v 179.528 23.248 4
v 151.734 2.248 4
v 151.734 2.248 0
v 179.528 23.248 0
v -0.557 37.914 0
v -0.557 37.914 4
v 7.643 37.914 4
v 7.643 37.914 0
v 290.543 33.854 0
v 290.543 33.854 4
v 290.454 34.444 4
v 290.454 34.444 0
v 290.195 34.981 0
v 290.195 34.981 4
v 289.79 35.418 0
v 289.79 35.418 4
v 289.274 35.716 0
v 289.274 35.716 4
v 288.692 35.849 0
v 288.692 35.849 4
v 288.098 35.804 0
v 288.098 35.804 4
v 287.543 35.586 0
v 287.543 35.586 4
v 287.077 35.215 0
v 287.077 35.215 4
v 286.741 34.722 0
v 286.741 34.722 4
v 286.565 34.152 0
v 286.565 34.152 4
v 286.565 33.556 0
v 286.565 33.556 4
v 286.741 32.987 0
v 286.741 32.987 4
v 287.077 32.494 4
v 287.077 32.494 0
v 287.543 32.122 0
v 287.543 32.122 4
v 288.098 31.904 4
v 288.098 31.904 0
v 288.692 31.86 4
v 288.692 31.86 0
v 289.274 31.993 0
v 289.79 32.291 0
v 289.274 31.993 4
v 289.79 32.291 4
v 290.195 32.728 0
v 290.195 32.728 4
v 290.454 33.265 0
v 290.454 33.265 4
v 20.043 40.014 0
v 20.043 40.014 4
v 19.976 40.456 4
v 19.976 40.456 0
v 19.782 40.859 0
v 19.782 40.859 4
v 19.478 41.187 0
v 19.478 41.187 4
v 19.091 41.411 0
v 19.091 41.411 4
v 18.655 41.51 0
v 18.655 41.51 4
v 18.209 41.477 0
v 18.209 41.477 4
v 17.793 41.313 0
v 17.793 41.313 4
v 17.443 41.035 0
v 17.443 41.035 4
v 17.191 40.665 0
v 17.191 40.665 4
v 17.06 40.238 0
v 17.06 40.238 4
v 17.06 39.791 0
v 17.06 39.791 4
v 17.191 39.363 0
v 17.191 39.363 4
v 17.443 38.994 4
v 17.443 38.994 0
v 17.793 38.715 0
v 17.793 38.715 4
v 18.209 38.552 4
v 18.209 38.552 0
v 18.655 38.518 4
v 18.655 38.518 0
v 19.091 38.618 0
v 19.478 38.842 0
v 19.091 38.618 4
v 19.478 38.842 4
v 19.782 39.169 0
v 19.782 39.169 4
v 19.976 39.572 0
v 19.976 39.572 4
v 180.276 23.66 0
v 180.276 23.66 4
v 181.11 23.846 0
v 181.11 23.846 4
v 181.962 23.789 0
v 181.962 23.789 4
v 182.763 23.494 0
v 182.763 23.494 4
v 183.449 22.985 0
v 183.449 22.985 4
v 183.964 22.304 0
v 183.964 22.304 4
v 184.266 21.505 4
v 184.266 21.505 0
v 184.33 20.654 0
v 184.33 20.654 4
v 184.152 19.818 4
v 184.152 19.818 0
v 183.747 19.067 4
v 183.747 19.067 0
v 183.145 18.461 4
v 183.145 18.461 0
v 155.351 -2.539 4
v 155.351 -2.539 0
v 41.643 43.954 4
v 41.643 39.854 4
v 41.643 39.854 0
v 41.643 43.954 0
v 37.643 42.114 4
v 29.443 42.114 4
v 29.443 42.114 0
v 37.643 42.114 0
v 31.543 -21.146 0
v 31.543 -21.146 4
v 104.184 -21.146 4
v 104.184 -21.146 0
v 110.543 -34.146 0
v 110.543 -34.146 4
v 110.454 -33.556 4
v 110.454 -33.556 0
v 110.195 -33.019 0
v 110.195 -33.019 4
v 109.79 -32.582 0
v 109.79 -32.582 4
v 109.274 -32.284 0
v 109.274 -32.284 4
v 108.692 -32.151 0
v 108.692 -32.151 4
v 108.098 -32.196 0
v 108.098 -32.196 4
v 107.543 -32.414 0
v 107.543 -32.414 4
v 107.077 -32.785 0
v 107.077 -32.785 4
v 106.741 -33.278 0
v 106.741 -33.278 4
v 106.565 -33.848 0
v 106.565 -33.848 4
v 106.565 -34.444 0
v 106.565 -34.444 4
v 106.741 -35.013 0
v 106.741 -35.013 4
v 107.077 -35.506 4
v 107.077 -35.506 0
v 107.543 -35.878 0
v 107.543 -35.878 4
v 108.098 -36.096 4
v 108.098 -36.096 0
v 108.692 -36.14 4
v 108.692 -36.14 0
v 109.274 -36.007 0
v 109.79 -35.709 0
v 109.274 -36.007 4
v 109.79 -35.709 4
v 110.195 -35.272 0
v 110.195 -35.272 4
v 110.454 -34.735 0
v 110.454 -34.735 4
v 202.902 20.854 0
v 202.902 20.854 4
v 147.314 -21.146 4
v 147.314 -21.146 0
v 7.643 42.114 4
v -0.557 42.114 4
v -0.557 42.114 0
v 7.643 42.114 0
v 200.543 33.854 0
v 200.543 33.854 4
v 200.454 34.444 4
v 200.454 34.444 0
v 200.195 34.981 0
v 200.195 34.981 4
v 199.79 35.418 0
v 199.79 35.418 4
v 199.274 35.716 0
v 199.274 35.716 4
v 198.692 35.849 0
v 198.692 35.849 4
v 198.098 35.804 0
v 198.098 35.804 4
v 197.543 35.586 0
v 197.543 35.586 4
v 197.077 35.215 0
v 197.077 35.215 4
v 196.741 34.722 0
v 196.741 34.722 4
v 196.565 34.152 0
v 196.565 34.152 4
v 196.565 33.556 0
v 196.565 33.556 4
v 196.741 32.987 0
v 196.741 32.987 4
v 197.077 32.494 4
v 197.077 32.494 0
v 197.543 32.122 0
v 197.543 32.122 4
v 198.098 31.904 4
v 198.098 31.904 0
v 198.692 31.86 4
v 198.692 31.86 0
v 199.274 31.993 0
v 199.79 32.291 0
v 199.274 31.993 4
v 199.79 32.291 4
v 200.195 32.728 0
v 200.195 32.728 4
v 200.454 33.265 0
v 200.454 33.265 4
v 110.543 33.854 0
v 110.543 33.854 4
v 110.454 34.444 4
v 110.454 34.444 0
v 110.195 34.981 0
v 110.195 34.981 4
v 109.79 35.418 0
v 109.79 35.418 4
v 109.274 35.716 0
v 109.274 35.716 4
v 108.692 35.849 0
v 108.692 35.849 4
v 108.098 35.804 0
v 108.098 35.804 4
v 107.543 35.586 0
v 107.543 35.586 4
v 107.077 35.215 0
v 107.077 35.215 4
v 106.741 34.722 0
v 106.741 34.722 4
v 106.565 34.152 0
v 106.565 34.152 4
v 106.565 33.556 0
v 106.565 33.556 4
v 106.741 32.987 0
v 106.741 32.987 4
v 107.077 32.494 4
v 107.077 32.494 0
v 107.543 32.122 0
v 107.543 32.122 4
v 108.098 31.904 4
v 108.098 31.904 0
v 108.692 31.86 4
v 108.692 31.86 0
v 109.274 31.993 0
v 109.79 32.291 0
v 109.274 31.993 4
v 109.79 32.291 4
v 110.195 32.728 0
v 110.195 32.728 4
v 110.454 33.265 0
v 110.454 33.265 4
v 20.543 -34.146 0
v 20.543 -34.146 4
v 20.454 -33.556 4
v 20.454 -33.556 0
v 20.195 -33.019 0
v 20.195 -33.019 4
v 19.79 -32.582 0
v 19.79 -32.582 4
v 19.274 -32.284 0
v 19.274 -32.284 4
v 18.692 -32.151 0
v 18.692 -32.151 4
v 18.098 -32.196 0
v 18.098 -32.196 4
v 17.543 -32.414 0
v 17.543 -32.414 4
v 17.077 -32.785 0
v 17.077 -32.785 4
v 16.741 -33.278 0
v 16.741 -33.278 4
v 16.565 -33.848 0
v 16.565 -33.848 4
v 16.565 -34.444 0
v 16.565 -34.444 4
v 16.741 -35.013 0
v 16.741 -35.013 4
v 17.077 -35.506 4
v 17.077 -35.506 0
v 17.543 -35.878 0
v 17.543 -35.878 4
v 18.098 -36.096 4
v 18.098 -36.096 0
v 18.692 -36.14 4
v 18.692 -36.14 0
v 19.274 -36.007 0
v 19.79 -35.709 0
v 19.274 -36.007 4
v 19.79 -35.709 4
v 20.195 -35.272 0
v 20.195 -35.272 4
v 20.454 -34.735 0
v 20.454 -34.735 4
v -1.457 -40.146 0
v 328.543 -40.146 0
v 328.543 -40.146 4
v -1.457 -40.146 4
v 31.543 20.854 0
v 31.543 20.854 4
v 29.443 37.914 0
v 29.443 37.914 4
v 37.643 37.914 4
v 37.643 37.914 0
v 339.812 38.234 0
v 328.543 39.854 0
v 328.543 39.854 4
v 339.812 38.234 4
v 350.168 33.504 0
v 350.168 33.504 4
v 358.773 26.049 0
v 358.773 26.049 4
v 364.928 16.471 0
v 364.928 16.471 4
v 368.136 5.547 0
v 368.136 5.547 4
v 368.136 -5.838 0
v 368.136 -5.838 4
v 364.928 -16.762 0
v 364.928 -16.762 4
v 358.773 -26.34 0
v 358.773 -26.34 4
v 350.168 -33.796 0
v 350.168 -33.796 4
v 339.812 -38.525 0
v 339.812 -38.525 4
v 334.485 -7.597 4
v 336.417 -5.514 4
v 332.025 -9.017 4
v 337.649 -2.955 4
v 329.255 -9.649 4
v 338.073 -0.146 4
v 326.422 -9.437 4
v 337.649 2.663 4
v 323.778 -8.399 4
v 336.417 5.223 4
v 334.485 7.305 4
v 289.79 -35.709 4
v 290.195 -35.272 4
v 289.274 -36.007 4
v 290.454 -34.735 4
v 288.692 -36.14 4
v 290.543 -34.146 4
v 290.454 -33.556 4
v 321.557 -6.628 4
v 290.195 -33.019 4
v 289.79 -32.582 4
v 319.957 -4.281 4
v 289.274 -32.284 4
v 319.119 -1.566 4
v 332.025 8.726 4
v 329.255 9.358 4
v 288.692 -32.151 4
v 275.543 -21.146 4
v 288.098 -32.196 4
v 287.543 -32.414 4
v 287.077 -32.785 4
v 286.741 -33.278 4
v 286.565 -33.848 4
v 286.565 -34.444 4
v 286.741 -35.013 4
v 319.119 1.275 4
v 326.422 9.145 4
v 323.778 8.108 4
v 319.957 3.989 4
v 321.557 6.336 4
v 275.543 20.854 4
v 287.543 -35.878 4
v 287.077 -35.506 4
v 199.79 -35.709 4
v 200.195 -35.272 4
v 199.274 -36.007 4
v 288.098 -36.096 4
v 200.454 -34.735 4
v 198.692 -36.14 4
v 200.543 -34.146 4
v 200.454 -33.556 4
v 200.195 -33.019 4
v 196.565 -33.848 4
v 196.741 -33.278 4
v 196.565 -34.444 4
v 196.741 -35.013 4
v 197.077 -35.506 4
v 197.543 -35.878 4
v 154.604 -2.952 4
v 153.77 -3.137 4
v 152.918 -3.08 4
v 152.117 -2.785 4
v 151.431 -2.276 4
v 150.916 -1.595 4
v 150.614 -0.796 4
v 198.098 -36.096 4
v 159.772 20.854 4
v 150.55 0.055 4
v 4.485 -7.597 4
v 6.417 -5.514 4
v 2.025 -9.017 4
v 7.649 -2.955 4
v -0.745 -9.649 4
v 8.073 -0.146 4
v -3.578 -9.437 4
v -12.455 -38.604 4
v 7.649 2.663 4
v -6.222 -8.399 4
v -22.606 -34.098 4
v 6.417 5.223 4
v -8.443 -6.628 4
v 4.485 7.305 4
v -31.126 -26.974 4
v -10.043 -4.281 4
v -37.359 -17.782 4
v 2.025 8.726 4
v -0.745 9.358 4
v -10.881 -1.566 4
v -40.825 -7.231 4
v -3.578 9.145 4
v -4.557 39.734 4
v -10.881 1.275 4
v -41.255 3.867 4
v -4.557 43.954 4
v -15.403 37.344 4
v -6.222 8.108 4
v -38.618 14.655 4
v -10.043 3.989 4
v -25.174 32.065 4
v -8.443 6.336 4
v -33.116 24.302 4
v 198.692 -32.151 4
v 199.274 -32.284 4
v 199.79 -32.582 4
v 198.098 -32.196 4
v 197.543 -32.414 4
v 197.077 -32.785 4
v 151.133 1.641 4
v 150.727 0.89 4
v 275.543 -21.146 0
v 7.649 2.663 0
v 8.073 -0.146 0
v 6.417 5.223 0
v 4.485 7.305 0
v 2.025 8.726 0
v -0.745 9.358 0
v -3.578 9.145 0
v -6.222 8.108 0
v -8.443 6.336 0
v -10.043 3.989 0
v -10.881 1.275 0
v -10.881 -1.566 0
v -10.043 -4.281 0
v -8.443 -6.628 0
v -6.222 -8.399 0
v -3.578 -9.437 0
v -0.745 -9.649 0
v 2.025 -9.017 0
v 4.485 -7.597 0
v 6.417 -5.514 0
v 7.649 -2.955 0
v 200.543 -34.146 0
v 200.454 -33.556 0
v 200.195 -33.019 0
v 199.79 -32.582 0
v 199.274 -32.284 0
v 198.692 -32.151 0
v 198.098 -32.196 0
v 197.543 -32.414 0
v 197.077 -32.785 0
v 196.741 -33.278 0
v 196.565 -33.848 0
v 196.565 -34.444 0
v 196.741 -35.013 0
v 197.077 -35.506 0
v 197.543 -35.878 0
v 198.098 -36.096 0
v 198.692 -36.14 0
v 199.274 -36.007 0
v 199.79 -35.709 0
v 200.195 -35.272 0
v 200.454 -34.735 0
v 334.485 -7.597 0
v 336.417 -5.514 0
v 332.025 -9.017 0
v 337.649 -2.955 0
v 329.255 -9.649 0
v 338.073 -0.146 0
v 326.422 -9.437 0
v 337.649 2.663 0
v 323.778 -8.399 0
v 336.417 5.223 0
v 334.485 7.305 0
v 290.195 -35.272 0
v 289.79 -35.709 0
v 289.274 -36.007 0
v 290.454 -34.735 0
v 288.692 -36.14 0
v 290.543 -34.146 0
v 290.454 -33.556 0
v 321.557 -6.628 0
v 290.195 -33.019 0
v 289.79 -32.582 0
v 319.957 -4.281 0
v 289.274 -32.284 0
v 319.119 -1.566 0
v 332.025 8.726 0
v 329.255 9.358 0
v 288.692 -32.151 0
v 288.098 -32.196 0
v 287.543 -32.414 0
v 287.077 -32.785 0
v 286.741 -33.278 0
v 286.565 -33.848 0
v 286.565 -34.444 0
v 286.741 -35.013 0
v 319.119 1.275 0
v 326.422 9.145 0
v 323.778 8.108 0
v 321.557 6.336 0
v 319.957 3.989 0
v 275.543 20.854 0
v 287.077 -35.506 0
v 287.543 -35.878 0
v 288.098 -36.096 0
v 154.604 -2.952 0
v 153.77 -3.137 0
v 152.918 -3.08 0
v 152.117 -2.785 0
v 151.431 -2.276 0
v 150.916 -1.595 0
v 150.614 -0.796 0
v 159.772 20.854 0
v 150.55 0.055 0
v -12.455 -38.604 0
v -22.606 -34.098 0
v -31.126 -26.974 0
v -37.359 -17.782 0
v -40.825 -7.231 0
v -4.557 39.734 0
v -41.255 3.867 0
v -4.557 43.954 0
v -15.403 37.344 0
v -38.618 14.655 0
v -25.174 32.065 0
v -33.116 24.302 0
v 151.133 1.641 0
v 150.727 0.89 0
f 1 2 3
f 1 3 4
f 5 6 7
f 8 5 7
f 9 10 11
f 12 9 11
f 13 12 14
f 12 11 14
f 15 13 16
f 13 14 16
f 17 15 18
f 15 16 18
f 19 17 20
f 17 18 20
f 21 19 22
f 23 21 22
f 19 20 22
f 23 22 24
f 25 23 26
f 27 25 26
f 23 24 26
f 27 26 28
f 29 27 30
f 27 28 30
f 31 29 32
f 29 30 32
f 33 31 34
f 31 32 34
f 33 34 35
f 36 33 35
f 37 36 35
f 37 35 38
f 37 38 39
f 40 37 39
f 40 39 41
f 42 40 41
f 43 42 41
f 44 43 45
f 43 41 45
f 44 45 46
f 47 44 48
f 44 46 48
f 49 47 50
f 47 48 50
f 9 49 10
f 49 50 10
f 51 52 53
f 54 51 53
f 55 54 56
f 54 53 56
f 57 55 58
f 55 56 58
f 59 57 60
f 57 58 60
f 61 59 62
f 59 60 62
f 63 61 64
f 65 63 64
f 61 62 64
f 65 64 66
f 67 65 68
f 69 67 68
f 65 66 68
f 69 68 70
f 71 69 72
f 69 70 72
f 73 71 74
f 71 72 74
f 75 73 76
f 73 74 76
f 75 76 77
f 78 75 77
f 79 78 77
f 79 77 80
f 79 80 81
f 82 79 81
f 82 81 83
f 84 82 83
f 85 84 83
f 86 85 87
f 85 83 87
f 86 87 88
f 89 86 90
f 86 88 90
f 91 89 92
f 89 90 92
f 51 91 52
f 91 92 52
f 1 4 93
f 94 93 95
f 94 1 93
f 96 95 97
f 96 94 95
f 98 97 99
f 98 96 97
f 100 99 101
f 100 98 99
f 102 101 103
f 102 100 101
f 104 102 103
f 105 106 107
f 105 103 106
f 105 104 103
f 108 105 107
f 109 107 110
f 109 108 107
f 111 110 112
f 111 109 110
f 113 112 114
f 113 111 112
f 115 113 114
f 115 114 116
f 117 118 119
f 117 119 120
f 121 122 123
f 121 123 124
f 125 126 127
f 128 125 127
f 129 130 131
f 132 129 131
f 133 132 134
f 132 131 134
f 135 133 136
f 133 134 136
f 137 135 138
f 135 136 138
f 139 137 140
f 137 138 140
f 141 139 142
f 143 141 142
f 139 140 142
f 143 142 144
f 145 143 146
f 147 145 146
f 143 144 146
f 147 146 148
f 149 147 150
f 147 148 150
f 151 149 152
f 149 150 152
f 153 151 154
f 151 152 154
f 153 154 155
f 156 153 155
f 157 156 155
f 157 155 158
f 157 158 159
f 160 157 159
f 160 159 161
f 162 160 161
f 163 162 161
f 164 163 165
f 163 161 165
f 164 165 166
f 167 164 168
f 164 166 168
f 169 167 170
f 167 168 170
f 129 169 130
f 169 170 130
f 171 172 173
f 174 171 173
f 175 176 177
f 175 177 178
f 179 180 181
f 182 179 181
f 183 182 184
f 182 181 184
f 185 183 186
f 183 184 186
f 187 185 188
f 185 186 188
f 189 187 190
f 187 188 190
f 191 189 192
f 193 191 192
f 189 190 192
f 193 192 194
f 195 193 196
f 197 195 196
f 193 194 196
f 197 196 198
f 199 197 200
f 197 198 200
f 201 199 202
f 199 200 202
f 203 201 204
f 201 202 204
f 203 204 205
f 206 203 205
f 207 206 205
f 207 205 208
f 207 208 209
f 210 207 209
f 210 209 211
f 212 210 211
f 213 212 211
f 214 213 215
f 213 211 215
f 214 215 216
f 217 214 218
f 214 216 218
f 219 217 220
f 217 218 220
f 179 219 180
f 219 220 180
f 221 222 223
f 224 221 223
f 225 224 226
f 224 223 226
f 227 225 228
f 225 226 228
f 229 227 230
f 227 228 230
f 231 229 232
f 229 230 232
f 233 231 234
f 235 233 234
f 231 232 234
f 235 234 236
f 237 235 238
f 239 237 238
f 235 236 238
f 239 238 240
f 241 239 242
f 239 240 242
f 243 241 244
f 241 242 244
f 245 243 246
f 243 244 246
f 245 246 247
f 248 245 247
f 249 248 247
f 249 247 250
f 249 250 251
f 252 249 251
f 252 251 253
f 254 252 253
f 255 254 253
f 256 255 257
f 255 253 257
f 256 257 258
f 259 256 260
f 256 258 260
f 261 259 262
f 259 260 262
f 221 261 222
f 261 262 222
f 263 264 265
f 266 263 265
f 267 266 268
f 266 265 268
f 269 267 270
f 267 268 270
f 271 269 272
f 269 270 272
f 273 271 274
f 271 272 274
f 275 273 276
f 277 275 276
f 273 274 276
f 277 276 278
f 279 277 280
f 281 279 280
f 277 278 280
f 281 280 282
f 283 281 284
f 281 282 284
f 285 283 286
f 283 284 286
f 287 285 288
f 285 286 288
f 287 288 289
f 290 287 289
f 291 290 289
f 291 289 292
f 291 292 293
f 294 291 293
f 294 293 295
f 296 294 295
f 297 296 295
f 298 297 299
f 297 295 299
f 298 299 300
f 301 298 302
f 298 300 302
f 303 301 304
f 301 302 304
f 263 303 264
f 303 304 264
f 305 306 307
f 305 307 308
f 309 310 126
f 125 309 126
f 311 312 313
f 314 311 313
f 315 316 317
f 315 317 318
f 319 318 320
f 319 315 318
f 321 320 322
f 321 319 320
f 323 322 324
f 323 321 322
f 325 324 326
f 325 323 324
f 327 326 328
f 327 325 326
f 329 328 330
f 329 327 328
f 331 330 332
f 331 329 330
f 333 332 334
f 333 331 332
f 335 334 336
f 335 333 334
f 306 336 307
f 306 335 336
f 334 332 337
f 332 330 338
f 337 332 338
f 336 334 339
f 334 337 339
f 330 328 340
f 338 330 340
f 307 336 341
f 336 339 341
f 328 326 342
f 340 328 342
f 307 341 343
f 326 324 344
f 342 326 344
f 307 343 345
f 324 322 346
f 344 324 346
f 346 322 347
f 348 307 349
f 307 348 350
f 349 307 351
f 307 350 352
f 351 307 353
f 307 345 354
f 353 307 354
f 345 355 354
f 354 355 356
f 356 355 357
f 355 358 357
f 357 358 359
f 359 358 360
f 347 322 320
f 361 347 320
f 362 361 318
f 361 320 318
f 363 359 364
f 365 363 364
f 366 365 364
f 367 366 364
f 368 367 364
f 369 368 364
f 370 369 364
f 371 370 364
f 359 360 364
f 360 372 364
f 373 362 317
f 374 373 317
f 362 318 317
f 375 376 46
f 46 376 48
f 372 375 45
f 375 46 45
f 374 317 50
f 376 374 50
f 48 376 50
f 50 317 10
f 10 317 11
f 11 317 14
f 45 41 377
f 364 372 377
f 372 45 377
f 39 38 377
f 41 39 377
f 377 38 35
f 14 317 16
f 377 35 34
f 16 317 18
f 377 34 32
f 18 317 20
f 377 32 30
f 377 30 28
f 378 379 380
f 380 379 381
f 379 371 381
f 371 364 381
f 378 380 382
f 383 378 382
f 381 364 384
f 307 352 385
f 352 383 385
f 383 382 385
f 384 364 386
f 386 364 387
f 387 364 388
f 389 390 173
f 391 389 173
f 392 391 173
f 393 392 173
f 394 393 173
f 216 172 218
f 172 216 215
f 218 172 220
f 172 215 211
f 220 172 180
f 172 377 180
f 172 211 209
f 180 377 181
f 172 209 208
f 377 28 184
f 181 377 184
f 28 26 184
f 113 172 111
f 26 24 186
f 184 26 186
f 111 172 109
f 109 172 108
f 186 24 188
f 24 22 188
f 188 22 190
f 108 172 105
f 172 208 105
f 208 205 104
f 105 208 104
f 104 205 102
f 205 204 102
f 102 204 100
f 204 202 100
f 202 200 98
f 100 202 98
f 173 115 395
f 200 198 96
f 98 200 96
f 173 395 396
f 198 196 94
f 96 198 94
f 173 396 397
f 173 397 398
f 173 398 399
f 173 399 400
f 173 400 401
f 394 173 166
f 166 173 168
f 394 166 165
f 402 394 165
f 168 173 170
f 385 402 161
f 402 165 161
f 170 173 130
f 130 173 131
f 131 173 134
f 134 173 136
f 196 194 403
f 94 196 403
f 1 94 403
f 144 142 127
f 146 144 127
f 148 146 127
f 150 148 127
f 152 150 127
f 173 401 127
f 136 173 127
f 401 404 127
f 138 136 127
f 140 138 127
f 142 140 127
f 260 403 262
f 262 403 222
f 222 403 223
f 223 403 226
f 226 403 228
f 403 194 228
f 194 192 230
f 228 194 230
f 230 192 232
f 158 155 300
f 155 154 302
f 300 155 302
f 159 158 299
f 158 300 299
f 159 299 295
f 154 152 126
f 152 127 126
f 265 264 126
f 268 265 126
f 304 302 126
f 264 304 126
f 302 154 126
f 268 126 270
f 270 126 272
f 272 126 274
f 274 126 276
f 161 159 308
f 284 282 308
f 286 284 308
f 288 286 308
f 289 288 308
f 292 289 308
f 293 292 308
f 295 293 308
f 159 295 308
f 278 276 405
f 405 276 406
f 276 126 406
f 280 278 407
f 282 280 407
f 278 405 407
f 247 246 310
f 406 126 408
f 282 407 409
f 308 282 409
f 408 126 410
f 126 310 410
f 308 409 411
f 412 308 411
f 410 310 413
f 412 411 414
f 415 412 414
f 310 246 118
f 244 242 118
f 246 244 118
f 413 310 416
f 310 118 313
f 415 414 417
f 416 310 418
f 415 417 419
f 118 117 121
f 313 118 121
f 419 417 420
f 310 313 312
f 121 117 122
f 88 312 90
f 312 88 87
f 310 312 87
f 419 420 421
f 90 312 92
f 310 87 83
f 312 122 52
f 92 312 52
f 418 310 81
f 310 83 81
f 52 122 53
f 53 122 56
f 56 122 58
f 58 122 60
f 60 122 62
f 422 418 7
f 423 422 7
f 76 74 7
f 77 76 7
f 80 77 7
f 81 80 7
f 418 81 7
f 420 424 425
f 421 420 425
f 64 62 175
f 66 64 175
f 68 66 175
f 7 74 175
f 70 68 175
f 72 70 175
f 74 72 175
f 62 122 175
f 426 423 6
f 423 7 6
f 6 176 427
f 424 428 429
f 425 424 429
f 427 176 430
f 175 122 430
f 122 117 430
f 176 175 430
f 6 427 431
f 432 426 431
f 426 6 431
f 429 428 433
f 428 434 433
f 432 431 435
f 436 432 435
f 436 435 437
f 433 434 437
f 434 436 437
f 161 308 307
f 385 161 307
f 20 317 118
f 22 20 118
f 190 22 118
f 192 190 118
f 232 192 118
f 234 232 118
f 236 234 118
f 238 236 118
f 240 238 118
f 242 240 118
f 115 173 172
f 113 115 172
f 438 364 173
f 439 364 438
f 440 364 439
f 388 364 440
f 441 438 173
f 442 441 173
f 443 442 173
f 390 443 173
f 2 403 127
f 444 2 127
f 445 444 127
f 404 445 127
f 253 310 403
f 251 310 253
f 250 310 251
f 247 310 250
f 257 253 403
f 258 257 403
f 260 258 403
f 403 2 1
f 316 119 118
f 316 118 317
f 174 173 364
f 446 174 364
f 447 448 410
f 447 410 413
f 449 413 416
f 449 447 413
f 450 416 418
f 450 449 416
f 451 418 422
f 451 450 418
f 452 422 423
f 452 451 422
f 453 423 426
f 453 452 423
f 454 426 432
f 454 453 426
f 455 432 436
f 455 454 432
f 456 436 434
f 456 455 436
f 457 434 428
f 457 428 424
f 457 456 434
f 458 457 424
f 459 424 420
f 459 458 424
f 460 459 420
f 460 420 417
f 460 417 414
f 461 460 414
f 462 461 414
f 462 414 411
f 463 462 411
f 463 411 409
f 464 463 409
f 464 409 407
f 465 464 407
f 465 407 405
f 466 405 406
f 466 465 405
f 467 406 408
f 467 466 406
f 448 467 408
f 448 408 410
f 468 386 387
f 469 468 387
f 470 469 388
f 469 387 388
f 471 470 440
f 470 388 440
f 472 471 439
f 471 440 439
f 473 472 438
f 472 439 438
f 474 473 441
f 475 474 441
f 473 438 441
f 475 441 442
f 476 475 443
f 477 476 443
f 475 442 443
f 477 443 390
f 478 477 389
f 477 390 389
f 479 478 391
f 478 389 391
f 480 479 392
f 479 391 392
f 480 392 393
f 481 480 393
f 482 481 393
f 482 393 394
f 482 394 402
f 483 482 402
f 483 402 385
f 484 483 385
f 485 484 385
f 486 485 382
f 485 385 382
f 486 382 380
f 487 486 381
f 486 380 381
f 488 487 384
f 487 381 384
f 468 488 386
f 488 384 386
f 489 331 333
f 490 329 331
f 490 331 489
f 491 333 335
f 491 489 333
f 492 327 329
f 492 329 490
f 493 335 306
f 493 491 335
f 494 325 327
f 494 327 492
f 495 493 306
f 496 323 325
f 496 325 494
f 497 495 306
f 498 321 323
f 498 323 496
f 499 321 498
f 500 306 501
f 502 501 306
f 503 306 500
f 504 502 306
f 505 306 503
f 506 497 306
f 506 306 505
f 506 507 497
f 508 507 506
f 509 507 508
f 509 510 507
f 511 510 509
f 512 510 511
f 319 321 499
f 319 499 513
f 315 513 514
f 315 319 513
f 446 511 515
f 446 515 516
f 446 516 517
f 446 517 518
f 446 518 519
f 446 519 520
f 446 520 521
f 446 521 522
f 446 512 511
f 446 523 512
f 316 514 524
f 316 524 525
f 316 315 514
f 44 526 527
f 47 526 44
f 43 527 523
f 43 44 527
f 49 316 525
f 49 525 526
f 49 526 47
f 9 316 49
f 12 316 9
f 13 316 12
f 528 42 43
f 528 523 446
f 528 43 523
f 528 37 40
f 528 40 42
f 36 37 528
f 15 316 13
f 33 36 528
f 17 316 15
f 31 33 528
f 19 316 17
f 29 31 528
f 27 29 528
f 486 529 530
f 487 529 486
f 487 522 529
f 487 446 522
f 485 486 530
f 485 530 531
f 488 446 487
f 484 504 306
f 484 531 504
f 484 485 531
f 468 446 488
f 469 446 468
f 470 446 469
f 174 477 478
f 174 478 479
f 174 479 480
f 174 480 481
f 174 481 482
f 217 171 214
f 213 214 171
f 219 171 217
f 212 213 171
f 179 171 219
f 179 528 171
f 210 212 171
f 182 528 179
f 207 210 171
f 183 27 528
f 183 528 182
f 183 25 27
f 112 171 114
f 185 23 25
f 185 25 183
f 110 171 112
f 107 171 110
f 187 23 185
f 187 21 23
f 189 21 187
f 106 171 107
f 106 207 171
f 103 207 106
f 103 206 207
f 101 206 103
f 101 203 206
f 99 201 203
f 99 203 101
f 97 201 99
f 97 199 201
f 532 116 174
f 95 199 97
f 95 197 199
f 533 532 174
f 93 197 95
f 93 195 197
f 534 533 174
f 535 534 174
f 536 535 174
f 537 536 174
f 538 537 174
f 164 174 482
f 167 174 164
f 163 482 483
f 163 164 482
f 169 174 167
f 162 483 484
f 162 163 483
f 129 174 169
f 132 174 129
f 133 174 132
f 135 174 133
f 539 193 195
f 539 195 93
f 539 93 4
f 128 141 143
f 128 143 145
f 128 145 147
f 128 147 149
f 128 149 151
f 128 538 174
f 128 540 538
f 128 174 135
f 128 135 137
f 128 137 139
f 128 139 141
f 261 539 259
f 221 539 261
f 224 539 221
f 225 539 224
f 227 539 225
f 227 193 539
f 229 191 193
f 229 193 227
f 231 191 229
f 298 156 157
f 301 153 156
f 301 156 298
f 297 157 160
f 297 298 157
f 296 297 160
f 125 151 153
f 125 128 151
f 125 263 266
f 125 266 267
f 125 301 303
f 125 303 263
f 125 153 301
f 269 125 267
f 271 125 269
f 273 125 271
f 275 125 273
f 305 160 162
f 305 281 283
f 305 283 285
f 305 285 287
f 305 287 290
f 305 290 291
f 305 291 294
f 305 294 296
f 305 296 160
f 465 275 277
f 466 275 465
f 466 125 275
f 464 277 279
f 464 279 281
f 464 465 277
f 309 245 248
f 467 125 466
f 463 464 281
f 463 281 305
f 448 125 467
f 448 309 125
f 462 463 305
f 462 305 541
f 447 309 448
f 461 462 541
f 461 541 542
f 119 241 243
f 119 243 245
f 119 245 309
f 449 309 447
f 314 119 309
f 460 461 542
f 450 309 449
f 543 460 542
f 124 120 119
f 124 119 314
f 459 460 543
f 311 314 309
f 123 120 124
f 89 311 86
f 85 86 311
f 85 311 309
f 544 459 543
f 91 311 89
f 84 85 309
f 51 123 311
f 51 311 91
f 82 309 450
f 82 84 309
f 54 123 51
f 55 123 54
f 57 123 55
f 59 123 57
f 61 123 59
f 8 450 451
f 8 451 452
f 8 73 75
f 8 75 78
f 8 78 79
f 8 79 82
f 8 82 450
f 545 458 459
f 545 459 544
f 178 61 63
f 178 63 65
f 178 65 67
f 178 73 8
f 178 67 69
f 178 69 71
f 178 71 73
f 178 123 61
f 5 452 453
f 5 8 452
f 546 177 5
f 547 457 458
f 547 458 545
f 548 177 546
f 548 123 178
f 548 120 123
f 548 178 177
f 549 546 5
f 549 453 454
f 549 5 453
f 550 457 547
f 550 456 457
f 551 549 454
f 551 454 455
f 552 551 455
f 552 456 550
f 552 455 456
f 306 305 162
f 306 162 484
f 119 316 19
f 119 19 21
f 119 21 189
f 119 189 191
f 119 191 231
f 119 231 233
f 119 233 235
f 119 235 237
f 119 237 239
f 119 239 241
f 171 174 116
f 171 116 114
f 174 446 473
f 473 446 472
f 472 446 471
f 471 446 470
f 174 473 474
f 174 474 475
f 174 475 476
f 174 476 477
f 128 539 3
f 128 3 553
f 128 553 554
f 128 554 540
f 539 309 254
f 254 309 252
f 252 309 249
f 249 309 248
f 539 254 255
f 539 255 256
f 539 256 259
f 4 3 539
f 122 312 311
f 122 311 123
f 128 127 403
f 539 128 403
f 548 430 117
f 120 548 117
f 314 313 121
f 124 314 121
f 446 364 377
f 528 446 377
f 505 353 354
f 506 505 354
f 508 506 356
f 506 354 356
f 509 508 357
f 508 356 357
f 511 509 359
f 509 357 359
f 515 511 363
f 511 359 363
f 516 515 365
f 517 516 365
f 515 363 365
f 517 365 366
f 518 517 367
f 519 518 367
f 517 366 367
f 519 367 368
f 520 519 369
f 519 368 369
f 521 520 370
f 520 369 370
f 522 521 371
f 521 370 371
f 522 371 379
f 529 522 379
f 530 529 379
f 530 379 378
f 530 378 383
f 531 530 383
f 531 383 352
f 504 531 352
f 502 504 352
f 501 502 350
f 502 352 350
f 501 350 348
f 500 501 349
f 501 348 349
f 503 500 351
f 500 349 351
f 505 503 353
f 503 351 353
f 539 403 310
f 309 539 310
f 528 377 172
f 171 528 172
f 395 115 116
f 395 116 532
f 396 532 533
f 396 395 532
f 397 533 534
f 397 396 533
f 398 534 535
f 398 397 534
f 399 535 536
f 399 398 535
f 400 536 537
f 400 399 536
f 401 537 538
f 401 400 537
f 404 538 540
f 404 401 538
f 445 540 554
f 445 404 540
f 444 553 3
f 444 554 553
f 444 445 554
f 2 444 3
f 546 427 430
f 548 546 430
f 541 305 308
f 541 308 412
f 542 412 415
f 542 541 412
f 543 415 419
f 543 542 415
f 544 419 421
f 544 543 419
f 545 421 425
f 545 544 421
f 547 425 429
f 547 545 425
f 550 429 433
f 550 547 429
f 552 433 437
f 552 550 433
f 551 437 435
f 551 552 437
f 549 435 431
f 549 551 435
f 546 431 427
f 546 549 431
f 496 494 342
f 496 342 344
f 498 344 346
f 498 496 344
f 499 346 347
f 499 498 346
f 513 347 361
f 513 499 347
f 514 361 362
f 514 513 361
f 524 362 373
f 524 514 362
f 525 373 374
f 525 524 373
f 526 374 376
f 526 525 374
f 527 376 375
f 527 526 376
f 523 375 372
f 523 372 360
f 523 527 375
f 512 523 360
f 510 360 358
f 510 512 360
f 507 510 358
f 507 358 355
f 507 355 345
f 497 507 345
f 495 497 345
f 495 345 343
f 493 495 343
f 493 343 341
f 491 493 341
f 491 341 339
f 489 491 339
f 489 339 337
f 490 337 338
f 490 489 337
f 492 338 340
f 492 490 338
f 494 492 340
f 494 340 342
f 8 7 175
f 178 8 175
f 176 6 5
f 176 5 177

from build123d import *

# Parameters (mm, degrees)
SKETCH_1_R          = 9.53
EXTRUDE_1_DEPTH     = 4
SKETCH_4_W          = 46.2
SKETCH_4_H          = 8.602857229
EXTRUDE_2_DEPTH     = 4
SKETCH_2_R          = 2
SKETCH_2_R_2        = 1.5
SKETCH_2_W          = 8.2
SKETCH_2_H          = 4.2
CUT_EXTRUDE_1_DEPTH = 4
CUT_EXTRUDE_2_DEPTH = 10


with BuildPart() as part:
    # 草图1 → 凸台-拉伸1 (new body)
    with BuildSketch(Plane.XY):
        with BuildLine():
            Line((328.542857143, -40.145714286), (-1.457142857, -40.145714286))
            ThreePointArc((-1.457142857, -40.145714286), (-41.457142857, -0.145714286), (-1.457142857, 39.854285714))
            Line((-1.457142857, 39.854285714), (328.542857143, 39.854285714))
            ThreePointArc((328.542857143, 39.854285714), (368.542857143, -0.145714286), (328.542857143, -40.145714286))
        make_face()
        with Locations((-1.457142857, -0.145714286)):
            Circle(SKETCH_1_R, mode=Mode.SUBTRACT)
        with Locations((328.542857143, -0.145714286)):
            Circle(SKETCH_1_R, mode=Mode.SUBTRACT)
    extrude(amount=EXTRUDE_1_DEPTH)

    # 草图4 → 凸台-拉伸2 (add)
    with BuildSketch(Plane.XY.offset(4)):
        with Locations((18.542857143, 39.652857099)):
            Rectangle(SKETCH_4_W, SKETCH_4_H)
    extrude(amount=-EXTRUDE_2_DEPTH)

    # 草图2 → 切除-拉伸1 (cut)
    with BuildSketch(Plane.XY.offset(4)):
        with Locations((108.542857143, 33.854285714)):
            Circle(SKETCH_2_R)
        with Locations((198.542857143, 33.854285714)):
            Circle(SKETCH_2_R)
        with Locations((288.542857143, 33.854285714)):
            Circle(SKETCH_2_R)
        with Locations((108.542857143, -34.145714286)):
            Circle(SKETCH_2_R)
        with Locations((198.542857143, -34.145714286)):
            Circle(SKETCH_2_R)
        with Locations((288.542857143, -34.145714286)):
            Circle(SKETCH_2_R)
        with Locations((18.542857143, -34.145714286)):
            Circle(SKETCH_2_R)
        with Locations((18.542857143, 40.014285714)):
            Circle(SKETCH_2_R_2)
        Polygon((31.542857143, -21.145714286), (104.183898028, -21.145714286), (159.772133322, 20.854285714), (31.542857143, 20.854285714), align=None)
        Polygon((275.542857143, 20.854285714), (202.901816258, 20.854285714), (147.313580964, -21.145714286), (275.542857143, -21.145714286), align=None)
        with Locations((33.542857143, 40.014285714)):
            Rectangle(SKETCH_2_W, SKETCH_2_H)
        with Locations((3.542857143, 40.014285714)):
            Rectangle(SKETCH_2_W, SKETCH_2_H)
    extrude(amount=-CUT_EXTRUDE_1_DEPTH, mode=Mode.SUBTRACT)

    # 草图3 → 切除-拉伸2 (cut)
    with BuildSketch(Plane.XY.offset(4)):
        with BuildLine():
            Line((183.145474057, 18.460683743), (155.35135641, -2.539316257))
            ThreePointArc((155.35135641, -2.539316257), (151.149255171, -1.954213553), (151.734357875, 2.247887686))
            Line((151.734357875, 2.247887686), (179.528475522, 23.247887686))
            ThreePointArc((179.528475522, 23.247887686), (183.730576762, 22.662784982), (183.145474057, 18.460683743))
        make_face()
    extrude(amount=-CUT_EXTRUDE_2_DEPTH, mode=Mode.SUBTRACT)


solid = part.part
